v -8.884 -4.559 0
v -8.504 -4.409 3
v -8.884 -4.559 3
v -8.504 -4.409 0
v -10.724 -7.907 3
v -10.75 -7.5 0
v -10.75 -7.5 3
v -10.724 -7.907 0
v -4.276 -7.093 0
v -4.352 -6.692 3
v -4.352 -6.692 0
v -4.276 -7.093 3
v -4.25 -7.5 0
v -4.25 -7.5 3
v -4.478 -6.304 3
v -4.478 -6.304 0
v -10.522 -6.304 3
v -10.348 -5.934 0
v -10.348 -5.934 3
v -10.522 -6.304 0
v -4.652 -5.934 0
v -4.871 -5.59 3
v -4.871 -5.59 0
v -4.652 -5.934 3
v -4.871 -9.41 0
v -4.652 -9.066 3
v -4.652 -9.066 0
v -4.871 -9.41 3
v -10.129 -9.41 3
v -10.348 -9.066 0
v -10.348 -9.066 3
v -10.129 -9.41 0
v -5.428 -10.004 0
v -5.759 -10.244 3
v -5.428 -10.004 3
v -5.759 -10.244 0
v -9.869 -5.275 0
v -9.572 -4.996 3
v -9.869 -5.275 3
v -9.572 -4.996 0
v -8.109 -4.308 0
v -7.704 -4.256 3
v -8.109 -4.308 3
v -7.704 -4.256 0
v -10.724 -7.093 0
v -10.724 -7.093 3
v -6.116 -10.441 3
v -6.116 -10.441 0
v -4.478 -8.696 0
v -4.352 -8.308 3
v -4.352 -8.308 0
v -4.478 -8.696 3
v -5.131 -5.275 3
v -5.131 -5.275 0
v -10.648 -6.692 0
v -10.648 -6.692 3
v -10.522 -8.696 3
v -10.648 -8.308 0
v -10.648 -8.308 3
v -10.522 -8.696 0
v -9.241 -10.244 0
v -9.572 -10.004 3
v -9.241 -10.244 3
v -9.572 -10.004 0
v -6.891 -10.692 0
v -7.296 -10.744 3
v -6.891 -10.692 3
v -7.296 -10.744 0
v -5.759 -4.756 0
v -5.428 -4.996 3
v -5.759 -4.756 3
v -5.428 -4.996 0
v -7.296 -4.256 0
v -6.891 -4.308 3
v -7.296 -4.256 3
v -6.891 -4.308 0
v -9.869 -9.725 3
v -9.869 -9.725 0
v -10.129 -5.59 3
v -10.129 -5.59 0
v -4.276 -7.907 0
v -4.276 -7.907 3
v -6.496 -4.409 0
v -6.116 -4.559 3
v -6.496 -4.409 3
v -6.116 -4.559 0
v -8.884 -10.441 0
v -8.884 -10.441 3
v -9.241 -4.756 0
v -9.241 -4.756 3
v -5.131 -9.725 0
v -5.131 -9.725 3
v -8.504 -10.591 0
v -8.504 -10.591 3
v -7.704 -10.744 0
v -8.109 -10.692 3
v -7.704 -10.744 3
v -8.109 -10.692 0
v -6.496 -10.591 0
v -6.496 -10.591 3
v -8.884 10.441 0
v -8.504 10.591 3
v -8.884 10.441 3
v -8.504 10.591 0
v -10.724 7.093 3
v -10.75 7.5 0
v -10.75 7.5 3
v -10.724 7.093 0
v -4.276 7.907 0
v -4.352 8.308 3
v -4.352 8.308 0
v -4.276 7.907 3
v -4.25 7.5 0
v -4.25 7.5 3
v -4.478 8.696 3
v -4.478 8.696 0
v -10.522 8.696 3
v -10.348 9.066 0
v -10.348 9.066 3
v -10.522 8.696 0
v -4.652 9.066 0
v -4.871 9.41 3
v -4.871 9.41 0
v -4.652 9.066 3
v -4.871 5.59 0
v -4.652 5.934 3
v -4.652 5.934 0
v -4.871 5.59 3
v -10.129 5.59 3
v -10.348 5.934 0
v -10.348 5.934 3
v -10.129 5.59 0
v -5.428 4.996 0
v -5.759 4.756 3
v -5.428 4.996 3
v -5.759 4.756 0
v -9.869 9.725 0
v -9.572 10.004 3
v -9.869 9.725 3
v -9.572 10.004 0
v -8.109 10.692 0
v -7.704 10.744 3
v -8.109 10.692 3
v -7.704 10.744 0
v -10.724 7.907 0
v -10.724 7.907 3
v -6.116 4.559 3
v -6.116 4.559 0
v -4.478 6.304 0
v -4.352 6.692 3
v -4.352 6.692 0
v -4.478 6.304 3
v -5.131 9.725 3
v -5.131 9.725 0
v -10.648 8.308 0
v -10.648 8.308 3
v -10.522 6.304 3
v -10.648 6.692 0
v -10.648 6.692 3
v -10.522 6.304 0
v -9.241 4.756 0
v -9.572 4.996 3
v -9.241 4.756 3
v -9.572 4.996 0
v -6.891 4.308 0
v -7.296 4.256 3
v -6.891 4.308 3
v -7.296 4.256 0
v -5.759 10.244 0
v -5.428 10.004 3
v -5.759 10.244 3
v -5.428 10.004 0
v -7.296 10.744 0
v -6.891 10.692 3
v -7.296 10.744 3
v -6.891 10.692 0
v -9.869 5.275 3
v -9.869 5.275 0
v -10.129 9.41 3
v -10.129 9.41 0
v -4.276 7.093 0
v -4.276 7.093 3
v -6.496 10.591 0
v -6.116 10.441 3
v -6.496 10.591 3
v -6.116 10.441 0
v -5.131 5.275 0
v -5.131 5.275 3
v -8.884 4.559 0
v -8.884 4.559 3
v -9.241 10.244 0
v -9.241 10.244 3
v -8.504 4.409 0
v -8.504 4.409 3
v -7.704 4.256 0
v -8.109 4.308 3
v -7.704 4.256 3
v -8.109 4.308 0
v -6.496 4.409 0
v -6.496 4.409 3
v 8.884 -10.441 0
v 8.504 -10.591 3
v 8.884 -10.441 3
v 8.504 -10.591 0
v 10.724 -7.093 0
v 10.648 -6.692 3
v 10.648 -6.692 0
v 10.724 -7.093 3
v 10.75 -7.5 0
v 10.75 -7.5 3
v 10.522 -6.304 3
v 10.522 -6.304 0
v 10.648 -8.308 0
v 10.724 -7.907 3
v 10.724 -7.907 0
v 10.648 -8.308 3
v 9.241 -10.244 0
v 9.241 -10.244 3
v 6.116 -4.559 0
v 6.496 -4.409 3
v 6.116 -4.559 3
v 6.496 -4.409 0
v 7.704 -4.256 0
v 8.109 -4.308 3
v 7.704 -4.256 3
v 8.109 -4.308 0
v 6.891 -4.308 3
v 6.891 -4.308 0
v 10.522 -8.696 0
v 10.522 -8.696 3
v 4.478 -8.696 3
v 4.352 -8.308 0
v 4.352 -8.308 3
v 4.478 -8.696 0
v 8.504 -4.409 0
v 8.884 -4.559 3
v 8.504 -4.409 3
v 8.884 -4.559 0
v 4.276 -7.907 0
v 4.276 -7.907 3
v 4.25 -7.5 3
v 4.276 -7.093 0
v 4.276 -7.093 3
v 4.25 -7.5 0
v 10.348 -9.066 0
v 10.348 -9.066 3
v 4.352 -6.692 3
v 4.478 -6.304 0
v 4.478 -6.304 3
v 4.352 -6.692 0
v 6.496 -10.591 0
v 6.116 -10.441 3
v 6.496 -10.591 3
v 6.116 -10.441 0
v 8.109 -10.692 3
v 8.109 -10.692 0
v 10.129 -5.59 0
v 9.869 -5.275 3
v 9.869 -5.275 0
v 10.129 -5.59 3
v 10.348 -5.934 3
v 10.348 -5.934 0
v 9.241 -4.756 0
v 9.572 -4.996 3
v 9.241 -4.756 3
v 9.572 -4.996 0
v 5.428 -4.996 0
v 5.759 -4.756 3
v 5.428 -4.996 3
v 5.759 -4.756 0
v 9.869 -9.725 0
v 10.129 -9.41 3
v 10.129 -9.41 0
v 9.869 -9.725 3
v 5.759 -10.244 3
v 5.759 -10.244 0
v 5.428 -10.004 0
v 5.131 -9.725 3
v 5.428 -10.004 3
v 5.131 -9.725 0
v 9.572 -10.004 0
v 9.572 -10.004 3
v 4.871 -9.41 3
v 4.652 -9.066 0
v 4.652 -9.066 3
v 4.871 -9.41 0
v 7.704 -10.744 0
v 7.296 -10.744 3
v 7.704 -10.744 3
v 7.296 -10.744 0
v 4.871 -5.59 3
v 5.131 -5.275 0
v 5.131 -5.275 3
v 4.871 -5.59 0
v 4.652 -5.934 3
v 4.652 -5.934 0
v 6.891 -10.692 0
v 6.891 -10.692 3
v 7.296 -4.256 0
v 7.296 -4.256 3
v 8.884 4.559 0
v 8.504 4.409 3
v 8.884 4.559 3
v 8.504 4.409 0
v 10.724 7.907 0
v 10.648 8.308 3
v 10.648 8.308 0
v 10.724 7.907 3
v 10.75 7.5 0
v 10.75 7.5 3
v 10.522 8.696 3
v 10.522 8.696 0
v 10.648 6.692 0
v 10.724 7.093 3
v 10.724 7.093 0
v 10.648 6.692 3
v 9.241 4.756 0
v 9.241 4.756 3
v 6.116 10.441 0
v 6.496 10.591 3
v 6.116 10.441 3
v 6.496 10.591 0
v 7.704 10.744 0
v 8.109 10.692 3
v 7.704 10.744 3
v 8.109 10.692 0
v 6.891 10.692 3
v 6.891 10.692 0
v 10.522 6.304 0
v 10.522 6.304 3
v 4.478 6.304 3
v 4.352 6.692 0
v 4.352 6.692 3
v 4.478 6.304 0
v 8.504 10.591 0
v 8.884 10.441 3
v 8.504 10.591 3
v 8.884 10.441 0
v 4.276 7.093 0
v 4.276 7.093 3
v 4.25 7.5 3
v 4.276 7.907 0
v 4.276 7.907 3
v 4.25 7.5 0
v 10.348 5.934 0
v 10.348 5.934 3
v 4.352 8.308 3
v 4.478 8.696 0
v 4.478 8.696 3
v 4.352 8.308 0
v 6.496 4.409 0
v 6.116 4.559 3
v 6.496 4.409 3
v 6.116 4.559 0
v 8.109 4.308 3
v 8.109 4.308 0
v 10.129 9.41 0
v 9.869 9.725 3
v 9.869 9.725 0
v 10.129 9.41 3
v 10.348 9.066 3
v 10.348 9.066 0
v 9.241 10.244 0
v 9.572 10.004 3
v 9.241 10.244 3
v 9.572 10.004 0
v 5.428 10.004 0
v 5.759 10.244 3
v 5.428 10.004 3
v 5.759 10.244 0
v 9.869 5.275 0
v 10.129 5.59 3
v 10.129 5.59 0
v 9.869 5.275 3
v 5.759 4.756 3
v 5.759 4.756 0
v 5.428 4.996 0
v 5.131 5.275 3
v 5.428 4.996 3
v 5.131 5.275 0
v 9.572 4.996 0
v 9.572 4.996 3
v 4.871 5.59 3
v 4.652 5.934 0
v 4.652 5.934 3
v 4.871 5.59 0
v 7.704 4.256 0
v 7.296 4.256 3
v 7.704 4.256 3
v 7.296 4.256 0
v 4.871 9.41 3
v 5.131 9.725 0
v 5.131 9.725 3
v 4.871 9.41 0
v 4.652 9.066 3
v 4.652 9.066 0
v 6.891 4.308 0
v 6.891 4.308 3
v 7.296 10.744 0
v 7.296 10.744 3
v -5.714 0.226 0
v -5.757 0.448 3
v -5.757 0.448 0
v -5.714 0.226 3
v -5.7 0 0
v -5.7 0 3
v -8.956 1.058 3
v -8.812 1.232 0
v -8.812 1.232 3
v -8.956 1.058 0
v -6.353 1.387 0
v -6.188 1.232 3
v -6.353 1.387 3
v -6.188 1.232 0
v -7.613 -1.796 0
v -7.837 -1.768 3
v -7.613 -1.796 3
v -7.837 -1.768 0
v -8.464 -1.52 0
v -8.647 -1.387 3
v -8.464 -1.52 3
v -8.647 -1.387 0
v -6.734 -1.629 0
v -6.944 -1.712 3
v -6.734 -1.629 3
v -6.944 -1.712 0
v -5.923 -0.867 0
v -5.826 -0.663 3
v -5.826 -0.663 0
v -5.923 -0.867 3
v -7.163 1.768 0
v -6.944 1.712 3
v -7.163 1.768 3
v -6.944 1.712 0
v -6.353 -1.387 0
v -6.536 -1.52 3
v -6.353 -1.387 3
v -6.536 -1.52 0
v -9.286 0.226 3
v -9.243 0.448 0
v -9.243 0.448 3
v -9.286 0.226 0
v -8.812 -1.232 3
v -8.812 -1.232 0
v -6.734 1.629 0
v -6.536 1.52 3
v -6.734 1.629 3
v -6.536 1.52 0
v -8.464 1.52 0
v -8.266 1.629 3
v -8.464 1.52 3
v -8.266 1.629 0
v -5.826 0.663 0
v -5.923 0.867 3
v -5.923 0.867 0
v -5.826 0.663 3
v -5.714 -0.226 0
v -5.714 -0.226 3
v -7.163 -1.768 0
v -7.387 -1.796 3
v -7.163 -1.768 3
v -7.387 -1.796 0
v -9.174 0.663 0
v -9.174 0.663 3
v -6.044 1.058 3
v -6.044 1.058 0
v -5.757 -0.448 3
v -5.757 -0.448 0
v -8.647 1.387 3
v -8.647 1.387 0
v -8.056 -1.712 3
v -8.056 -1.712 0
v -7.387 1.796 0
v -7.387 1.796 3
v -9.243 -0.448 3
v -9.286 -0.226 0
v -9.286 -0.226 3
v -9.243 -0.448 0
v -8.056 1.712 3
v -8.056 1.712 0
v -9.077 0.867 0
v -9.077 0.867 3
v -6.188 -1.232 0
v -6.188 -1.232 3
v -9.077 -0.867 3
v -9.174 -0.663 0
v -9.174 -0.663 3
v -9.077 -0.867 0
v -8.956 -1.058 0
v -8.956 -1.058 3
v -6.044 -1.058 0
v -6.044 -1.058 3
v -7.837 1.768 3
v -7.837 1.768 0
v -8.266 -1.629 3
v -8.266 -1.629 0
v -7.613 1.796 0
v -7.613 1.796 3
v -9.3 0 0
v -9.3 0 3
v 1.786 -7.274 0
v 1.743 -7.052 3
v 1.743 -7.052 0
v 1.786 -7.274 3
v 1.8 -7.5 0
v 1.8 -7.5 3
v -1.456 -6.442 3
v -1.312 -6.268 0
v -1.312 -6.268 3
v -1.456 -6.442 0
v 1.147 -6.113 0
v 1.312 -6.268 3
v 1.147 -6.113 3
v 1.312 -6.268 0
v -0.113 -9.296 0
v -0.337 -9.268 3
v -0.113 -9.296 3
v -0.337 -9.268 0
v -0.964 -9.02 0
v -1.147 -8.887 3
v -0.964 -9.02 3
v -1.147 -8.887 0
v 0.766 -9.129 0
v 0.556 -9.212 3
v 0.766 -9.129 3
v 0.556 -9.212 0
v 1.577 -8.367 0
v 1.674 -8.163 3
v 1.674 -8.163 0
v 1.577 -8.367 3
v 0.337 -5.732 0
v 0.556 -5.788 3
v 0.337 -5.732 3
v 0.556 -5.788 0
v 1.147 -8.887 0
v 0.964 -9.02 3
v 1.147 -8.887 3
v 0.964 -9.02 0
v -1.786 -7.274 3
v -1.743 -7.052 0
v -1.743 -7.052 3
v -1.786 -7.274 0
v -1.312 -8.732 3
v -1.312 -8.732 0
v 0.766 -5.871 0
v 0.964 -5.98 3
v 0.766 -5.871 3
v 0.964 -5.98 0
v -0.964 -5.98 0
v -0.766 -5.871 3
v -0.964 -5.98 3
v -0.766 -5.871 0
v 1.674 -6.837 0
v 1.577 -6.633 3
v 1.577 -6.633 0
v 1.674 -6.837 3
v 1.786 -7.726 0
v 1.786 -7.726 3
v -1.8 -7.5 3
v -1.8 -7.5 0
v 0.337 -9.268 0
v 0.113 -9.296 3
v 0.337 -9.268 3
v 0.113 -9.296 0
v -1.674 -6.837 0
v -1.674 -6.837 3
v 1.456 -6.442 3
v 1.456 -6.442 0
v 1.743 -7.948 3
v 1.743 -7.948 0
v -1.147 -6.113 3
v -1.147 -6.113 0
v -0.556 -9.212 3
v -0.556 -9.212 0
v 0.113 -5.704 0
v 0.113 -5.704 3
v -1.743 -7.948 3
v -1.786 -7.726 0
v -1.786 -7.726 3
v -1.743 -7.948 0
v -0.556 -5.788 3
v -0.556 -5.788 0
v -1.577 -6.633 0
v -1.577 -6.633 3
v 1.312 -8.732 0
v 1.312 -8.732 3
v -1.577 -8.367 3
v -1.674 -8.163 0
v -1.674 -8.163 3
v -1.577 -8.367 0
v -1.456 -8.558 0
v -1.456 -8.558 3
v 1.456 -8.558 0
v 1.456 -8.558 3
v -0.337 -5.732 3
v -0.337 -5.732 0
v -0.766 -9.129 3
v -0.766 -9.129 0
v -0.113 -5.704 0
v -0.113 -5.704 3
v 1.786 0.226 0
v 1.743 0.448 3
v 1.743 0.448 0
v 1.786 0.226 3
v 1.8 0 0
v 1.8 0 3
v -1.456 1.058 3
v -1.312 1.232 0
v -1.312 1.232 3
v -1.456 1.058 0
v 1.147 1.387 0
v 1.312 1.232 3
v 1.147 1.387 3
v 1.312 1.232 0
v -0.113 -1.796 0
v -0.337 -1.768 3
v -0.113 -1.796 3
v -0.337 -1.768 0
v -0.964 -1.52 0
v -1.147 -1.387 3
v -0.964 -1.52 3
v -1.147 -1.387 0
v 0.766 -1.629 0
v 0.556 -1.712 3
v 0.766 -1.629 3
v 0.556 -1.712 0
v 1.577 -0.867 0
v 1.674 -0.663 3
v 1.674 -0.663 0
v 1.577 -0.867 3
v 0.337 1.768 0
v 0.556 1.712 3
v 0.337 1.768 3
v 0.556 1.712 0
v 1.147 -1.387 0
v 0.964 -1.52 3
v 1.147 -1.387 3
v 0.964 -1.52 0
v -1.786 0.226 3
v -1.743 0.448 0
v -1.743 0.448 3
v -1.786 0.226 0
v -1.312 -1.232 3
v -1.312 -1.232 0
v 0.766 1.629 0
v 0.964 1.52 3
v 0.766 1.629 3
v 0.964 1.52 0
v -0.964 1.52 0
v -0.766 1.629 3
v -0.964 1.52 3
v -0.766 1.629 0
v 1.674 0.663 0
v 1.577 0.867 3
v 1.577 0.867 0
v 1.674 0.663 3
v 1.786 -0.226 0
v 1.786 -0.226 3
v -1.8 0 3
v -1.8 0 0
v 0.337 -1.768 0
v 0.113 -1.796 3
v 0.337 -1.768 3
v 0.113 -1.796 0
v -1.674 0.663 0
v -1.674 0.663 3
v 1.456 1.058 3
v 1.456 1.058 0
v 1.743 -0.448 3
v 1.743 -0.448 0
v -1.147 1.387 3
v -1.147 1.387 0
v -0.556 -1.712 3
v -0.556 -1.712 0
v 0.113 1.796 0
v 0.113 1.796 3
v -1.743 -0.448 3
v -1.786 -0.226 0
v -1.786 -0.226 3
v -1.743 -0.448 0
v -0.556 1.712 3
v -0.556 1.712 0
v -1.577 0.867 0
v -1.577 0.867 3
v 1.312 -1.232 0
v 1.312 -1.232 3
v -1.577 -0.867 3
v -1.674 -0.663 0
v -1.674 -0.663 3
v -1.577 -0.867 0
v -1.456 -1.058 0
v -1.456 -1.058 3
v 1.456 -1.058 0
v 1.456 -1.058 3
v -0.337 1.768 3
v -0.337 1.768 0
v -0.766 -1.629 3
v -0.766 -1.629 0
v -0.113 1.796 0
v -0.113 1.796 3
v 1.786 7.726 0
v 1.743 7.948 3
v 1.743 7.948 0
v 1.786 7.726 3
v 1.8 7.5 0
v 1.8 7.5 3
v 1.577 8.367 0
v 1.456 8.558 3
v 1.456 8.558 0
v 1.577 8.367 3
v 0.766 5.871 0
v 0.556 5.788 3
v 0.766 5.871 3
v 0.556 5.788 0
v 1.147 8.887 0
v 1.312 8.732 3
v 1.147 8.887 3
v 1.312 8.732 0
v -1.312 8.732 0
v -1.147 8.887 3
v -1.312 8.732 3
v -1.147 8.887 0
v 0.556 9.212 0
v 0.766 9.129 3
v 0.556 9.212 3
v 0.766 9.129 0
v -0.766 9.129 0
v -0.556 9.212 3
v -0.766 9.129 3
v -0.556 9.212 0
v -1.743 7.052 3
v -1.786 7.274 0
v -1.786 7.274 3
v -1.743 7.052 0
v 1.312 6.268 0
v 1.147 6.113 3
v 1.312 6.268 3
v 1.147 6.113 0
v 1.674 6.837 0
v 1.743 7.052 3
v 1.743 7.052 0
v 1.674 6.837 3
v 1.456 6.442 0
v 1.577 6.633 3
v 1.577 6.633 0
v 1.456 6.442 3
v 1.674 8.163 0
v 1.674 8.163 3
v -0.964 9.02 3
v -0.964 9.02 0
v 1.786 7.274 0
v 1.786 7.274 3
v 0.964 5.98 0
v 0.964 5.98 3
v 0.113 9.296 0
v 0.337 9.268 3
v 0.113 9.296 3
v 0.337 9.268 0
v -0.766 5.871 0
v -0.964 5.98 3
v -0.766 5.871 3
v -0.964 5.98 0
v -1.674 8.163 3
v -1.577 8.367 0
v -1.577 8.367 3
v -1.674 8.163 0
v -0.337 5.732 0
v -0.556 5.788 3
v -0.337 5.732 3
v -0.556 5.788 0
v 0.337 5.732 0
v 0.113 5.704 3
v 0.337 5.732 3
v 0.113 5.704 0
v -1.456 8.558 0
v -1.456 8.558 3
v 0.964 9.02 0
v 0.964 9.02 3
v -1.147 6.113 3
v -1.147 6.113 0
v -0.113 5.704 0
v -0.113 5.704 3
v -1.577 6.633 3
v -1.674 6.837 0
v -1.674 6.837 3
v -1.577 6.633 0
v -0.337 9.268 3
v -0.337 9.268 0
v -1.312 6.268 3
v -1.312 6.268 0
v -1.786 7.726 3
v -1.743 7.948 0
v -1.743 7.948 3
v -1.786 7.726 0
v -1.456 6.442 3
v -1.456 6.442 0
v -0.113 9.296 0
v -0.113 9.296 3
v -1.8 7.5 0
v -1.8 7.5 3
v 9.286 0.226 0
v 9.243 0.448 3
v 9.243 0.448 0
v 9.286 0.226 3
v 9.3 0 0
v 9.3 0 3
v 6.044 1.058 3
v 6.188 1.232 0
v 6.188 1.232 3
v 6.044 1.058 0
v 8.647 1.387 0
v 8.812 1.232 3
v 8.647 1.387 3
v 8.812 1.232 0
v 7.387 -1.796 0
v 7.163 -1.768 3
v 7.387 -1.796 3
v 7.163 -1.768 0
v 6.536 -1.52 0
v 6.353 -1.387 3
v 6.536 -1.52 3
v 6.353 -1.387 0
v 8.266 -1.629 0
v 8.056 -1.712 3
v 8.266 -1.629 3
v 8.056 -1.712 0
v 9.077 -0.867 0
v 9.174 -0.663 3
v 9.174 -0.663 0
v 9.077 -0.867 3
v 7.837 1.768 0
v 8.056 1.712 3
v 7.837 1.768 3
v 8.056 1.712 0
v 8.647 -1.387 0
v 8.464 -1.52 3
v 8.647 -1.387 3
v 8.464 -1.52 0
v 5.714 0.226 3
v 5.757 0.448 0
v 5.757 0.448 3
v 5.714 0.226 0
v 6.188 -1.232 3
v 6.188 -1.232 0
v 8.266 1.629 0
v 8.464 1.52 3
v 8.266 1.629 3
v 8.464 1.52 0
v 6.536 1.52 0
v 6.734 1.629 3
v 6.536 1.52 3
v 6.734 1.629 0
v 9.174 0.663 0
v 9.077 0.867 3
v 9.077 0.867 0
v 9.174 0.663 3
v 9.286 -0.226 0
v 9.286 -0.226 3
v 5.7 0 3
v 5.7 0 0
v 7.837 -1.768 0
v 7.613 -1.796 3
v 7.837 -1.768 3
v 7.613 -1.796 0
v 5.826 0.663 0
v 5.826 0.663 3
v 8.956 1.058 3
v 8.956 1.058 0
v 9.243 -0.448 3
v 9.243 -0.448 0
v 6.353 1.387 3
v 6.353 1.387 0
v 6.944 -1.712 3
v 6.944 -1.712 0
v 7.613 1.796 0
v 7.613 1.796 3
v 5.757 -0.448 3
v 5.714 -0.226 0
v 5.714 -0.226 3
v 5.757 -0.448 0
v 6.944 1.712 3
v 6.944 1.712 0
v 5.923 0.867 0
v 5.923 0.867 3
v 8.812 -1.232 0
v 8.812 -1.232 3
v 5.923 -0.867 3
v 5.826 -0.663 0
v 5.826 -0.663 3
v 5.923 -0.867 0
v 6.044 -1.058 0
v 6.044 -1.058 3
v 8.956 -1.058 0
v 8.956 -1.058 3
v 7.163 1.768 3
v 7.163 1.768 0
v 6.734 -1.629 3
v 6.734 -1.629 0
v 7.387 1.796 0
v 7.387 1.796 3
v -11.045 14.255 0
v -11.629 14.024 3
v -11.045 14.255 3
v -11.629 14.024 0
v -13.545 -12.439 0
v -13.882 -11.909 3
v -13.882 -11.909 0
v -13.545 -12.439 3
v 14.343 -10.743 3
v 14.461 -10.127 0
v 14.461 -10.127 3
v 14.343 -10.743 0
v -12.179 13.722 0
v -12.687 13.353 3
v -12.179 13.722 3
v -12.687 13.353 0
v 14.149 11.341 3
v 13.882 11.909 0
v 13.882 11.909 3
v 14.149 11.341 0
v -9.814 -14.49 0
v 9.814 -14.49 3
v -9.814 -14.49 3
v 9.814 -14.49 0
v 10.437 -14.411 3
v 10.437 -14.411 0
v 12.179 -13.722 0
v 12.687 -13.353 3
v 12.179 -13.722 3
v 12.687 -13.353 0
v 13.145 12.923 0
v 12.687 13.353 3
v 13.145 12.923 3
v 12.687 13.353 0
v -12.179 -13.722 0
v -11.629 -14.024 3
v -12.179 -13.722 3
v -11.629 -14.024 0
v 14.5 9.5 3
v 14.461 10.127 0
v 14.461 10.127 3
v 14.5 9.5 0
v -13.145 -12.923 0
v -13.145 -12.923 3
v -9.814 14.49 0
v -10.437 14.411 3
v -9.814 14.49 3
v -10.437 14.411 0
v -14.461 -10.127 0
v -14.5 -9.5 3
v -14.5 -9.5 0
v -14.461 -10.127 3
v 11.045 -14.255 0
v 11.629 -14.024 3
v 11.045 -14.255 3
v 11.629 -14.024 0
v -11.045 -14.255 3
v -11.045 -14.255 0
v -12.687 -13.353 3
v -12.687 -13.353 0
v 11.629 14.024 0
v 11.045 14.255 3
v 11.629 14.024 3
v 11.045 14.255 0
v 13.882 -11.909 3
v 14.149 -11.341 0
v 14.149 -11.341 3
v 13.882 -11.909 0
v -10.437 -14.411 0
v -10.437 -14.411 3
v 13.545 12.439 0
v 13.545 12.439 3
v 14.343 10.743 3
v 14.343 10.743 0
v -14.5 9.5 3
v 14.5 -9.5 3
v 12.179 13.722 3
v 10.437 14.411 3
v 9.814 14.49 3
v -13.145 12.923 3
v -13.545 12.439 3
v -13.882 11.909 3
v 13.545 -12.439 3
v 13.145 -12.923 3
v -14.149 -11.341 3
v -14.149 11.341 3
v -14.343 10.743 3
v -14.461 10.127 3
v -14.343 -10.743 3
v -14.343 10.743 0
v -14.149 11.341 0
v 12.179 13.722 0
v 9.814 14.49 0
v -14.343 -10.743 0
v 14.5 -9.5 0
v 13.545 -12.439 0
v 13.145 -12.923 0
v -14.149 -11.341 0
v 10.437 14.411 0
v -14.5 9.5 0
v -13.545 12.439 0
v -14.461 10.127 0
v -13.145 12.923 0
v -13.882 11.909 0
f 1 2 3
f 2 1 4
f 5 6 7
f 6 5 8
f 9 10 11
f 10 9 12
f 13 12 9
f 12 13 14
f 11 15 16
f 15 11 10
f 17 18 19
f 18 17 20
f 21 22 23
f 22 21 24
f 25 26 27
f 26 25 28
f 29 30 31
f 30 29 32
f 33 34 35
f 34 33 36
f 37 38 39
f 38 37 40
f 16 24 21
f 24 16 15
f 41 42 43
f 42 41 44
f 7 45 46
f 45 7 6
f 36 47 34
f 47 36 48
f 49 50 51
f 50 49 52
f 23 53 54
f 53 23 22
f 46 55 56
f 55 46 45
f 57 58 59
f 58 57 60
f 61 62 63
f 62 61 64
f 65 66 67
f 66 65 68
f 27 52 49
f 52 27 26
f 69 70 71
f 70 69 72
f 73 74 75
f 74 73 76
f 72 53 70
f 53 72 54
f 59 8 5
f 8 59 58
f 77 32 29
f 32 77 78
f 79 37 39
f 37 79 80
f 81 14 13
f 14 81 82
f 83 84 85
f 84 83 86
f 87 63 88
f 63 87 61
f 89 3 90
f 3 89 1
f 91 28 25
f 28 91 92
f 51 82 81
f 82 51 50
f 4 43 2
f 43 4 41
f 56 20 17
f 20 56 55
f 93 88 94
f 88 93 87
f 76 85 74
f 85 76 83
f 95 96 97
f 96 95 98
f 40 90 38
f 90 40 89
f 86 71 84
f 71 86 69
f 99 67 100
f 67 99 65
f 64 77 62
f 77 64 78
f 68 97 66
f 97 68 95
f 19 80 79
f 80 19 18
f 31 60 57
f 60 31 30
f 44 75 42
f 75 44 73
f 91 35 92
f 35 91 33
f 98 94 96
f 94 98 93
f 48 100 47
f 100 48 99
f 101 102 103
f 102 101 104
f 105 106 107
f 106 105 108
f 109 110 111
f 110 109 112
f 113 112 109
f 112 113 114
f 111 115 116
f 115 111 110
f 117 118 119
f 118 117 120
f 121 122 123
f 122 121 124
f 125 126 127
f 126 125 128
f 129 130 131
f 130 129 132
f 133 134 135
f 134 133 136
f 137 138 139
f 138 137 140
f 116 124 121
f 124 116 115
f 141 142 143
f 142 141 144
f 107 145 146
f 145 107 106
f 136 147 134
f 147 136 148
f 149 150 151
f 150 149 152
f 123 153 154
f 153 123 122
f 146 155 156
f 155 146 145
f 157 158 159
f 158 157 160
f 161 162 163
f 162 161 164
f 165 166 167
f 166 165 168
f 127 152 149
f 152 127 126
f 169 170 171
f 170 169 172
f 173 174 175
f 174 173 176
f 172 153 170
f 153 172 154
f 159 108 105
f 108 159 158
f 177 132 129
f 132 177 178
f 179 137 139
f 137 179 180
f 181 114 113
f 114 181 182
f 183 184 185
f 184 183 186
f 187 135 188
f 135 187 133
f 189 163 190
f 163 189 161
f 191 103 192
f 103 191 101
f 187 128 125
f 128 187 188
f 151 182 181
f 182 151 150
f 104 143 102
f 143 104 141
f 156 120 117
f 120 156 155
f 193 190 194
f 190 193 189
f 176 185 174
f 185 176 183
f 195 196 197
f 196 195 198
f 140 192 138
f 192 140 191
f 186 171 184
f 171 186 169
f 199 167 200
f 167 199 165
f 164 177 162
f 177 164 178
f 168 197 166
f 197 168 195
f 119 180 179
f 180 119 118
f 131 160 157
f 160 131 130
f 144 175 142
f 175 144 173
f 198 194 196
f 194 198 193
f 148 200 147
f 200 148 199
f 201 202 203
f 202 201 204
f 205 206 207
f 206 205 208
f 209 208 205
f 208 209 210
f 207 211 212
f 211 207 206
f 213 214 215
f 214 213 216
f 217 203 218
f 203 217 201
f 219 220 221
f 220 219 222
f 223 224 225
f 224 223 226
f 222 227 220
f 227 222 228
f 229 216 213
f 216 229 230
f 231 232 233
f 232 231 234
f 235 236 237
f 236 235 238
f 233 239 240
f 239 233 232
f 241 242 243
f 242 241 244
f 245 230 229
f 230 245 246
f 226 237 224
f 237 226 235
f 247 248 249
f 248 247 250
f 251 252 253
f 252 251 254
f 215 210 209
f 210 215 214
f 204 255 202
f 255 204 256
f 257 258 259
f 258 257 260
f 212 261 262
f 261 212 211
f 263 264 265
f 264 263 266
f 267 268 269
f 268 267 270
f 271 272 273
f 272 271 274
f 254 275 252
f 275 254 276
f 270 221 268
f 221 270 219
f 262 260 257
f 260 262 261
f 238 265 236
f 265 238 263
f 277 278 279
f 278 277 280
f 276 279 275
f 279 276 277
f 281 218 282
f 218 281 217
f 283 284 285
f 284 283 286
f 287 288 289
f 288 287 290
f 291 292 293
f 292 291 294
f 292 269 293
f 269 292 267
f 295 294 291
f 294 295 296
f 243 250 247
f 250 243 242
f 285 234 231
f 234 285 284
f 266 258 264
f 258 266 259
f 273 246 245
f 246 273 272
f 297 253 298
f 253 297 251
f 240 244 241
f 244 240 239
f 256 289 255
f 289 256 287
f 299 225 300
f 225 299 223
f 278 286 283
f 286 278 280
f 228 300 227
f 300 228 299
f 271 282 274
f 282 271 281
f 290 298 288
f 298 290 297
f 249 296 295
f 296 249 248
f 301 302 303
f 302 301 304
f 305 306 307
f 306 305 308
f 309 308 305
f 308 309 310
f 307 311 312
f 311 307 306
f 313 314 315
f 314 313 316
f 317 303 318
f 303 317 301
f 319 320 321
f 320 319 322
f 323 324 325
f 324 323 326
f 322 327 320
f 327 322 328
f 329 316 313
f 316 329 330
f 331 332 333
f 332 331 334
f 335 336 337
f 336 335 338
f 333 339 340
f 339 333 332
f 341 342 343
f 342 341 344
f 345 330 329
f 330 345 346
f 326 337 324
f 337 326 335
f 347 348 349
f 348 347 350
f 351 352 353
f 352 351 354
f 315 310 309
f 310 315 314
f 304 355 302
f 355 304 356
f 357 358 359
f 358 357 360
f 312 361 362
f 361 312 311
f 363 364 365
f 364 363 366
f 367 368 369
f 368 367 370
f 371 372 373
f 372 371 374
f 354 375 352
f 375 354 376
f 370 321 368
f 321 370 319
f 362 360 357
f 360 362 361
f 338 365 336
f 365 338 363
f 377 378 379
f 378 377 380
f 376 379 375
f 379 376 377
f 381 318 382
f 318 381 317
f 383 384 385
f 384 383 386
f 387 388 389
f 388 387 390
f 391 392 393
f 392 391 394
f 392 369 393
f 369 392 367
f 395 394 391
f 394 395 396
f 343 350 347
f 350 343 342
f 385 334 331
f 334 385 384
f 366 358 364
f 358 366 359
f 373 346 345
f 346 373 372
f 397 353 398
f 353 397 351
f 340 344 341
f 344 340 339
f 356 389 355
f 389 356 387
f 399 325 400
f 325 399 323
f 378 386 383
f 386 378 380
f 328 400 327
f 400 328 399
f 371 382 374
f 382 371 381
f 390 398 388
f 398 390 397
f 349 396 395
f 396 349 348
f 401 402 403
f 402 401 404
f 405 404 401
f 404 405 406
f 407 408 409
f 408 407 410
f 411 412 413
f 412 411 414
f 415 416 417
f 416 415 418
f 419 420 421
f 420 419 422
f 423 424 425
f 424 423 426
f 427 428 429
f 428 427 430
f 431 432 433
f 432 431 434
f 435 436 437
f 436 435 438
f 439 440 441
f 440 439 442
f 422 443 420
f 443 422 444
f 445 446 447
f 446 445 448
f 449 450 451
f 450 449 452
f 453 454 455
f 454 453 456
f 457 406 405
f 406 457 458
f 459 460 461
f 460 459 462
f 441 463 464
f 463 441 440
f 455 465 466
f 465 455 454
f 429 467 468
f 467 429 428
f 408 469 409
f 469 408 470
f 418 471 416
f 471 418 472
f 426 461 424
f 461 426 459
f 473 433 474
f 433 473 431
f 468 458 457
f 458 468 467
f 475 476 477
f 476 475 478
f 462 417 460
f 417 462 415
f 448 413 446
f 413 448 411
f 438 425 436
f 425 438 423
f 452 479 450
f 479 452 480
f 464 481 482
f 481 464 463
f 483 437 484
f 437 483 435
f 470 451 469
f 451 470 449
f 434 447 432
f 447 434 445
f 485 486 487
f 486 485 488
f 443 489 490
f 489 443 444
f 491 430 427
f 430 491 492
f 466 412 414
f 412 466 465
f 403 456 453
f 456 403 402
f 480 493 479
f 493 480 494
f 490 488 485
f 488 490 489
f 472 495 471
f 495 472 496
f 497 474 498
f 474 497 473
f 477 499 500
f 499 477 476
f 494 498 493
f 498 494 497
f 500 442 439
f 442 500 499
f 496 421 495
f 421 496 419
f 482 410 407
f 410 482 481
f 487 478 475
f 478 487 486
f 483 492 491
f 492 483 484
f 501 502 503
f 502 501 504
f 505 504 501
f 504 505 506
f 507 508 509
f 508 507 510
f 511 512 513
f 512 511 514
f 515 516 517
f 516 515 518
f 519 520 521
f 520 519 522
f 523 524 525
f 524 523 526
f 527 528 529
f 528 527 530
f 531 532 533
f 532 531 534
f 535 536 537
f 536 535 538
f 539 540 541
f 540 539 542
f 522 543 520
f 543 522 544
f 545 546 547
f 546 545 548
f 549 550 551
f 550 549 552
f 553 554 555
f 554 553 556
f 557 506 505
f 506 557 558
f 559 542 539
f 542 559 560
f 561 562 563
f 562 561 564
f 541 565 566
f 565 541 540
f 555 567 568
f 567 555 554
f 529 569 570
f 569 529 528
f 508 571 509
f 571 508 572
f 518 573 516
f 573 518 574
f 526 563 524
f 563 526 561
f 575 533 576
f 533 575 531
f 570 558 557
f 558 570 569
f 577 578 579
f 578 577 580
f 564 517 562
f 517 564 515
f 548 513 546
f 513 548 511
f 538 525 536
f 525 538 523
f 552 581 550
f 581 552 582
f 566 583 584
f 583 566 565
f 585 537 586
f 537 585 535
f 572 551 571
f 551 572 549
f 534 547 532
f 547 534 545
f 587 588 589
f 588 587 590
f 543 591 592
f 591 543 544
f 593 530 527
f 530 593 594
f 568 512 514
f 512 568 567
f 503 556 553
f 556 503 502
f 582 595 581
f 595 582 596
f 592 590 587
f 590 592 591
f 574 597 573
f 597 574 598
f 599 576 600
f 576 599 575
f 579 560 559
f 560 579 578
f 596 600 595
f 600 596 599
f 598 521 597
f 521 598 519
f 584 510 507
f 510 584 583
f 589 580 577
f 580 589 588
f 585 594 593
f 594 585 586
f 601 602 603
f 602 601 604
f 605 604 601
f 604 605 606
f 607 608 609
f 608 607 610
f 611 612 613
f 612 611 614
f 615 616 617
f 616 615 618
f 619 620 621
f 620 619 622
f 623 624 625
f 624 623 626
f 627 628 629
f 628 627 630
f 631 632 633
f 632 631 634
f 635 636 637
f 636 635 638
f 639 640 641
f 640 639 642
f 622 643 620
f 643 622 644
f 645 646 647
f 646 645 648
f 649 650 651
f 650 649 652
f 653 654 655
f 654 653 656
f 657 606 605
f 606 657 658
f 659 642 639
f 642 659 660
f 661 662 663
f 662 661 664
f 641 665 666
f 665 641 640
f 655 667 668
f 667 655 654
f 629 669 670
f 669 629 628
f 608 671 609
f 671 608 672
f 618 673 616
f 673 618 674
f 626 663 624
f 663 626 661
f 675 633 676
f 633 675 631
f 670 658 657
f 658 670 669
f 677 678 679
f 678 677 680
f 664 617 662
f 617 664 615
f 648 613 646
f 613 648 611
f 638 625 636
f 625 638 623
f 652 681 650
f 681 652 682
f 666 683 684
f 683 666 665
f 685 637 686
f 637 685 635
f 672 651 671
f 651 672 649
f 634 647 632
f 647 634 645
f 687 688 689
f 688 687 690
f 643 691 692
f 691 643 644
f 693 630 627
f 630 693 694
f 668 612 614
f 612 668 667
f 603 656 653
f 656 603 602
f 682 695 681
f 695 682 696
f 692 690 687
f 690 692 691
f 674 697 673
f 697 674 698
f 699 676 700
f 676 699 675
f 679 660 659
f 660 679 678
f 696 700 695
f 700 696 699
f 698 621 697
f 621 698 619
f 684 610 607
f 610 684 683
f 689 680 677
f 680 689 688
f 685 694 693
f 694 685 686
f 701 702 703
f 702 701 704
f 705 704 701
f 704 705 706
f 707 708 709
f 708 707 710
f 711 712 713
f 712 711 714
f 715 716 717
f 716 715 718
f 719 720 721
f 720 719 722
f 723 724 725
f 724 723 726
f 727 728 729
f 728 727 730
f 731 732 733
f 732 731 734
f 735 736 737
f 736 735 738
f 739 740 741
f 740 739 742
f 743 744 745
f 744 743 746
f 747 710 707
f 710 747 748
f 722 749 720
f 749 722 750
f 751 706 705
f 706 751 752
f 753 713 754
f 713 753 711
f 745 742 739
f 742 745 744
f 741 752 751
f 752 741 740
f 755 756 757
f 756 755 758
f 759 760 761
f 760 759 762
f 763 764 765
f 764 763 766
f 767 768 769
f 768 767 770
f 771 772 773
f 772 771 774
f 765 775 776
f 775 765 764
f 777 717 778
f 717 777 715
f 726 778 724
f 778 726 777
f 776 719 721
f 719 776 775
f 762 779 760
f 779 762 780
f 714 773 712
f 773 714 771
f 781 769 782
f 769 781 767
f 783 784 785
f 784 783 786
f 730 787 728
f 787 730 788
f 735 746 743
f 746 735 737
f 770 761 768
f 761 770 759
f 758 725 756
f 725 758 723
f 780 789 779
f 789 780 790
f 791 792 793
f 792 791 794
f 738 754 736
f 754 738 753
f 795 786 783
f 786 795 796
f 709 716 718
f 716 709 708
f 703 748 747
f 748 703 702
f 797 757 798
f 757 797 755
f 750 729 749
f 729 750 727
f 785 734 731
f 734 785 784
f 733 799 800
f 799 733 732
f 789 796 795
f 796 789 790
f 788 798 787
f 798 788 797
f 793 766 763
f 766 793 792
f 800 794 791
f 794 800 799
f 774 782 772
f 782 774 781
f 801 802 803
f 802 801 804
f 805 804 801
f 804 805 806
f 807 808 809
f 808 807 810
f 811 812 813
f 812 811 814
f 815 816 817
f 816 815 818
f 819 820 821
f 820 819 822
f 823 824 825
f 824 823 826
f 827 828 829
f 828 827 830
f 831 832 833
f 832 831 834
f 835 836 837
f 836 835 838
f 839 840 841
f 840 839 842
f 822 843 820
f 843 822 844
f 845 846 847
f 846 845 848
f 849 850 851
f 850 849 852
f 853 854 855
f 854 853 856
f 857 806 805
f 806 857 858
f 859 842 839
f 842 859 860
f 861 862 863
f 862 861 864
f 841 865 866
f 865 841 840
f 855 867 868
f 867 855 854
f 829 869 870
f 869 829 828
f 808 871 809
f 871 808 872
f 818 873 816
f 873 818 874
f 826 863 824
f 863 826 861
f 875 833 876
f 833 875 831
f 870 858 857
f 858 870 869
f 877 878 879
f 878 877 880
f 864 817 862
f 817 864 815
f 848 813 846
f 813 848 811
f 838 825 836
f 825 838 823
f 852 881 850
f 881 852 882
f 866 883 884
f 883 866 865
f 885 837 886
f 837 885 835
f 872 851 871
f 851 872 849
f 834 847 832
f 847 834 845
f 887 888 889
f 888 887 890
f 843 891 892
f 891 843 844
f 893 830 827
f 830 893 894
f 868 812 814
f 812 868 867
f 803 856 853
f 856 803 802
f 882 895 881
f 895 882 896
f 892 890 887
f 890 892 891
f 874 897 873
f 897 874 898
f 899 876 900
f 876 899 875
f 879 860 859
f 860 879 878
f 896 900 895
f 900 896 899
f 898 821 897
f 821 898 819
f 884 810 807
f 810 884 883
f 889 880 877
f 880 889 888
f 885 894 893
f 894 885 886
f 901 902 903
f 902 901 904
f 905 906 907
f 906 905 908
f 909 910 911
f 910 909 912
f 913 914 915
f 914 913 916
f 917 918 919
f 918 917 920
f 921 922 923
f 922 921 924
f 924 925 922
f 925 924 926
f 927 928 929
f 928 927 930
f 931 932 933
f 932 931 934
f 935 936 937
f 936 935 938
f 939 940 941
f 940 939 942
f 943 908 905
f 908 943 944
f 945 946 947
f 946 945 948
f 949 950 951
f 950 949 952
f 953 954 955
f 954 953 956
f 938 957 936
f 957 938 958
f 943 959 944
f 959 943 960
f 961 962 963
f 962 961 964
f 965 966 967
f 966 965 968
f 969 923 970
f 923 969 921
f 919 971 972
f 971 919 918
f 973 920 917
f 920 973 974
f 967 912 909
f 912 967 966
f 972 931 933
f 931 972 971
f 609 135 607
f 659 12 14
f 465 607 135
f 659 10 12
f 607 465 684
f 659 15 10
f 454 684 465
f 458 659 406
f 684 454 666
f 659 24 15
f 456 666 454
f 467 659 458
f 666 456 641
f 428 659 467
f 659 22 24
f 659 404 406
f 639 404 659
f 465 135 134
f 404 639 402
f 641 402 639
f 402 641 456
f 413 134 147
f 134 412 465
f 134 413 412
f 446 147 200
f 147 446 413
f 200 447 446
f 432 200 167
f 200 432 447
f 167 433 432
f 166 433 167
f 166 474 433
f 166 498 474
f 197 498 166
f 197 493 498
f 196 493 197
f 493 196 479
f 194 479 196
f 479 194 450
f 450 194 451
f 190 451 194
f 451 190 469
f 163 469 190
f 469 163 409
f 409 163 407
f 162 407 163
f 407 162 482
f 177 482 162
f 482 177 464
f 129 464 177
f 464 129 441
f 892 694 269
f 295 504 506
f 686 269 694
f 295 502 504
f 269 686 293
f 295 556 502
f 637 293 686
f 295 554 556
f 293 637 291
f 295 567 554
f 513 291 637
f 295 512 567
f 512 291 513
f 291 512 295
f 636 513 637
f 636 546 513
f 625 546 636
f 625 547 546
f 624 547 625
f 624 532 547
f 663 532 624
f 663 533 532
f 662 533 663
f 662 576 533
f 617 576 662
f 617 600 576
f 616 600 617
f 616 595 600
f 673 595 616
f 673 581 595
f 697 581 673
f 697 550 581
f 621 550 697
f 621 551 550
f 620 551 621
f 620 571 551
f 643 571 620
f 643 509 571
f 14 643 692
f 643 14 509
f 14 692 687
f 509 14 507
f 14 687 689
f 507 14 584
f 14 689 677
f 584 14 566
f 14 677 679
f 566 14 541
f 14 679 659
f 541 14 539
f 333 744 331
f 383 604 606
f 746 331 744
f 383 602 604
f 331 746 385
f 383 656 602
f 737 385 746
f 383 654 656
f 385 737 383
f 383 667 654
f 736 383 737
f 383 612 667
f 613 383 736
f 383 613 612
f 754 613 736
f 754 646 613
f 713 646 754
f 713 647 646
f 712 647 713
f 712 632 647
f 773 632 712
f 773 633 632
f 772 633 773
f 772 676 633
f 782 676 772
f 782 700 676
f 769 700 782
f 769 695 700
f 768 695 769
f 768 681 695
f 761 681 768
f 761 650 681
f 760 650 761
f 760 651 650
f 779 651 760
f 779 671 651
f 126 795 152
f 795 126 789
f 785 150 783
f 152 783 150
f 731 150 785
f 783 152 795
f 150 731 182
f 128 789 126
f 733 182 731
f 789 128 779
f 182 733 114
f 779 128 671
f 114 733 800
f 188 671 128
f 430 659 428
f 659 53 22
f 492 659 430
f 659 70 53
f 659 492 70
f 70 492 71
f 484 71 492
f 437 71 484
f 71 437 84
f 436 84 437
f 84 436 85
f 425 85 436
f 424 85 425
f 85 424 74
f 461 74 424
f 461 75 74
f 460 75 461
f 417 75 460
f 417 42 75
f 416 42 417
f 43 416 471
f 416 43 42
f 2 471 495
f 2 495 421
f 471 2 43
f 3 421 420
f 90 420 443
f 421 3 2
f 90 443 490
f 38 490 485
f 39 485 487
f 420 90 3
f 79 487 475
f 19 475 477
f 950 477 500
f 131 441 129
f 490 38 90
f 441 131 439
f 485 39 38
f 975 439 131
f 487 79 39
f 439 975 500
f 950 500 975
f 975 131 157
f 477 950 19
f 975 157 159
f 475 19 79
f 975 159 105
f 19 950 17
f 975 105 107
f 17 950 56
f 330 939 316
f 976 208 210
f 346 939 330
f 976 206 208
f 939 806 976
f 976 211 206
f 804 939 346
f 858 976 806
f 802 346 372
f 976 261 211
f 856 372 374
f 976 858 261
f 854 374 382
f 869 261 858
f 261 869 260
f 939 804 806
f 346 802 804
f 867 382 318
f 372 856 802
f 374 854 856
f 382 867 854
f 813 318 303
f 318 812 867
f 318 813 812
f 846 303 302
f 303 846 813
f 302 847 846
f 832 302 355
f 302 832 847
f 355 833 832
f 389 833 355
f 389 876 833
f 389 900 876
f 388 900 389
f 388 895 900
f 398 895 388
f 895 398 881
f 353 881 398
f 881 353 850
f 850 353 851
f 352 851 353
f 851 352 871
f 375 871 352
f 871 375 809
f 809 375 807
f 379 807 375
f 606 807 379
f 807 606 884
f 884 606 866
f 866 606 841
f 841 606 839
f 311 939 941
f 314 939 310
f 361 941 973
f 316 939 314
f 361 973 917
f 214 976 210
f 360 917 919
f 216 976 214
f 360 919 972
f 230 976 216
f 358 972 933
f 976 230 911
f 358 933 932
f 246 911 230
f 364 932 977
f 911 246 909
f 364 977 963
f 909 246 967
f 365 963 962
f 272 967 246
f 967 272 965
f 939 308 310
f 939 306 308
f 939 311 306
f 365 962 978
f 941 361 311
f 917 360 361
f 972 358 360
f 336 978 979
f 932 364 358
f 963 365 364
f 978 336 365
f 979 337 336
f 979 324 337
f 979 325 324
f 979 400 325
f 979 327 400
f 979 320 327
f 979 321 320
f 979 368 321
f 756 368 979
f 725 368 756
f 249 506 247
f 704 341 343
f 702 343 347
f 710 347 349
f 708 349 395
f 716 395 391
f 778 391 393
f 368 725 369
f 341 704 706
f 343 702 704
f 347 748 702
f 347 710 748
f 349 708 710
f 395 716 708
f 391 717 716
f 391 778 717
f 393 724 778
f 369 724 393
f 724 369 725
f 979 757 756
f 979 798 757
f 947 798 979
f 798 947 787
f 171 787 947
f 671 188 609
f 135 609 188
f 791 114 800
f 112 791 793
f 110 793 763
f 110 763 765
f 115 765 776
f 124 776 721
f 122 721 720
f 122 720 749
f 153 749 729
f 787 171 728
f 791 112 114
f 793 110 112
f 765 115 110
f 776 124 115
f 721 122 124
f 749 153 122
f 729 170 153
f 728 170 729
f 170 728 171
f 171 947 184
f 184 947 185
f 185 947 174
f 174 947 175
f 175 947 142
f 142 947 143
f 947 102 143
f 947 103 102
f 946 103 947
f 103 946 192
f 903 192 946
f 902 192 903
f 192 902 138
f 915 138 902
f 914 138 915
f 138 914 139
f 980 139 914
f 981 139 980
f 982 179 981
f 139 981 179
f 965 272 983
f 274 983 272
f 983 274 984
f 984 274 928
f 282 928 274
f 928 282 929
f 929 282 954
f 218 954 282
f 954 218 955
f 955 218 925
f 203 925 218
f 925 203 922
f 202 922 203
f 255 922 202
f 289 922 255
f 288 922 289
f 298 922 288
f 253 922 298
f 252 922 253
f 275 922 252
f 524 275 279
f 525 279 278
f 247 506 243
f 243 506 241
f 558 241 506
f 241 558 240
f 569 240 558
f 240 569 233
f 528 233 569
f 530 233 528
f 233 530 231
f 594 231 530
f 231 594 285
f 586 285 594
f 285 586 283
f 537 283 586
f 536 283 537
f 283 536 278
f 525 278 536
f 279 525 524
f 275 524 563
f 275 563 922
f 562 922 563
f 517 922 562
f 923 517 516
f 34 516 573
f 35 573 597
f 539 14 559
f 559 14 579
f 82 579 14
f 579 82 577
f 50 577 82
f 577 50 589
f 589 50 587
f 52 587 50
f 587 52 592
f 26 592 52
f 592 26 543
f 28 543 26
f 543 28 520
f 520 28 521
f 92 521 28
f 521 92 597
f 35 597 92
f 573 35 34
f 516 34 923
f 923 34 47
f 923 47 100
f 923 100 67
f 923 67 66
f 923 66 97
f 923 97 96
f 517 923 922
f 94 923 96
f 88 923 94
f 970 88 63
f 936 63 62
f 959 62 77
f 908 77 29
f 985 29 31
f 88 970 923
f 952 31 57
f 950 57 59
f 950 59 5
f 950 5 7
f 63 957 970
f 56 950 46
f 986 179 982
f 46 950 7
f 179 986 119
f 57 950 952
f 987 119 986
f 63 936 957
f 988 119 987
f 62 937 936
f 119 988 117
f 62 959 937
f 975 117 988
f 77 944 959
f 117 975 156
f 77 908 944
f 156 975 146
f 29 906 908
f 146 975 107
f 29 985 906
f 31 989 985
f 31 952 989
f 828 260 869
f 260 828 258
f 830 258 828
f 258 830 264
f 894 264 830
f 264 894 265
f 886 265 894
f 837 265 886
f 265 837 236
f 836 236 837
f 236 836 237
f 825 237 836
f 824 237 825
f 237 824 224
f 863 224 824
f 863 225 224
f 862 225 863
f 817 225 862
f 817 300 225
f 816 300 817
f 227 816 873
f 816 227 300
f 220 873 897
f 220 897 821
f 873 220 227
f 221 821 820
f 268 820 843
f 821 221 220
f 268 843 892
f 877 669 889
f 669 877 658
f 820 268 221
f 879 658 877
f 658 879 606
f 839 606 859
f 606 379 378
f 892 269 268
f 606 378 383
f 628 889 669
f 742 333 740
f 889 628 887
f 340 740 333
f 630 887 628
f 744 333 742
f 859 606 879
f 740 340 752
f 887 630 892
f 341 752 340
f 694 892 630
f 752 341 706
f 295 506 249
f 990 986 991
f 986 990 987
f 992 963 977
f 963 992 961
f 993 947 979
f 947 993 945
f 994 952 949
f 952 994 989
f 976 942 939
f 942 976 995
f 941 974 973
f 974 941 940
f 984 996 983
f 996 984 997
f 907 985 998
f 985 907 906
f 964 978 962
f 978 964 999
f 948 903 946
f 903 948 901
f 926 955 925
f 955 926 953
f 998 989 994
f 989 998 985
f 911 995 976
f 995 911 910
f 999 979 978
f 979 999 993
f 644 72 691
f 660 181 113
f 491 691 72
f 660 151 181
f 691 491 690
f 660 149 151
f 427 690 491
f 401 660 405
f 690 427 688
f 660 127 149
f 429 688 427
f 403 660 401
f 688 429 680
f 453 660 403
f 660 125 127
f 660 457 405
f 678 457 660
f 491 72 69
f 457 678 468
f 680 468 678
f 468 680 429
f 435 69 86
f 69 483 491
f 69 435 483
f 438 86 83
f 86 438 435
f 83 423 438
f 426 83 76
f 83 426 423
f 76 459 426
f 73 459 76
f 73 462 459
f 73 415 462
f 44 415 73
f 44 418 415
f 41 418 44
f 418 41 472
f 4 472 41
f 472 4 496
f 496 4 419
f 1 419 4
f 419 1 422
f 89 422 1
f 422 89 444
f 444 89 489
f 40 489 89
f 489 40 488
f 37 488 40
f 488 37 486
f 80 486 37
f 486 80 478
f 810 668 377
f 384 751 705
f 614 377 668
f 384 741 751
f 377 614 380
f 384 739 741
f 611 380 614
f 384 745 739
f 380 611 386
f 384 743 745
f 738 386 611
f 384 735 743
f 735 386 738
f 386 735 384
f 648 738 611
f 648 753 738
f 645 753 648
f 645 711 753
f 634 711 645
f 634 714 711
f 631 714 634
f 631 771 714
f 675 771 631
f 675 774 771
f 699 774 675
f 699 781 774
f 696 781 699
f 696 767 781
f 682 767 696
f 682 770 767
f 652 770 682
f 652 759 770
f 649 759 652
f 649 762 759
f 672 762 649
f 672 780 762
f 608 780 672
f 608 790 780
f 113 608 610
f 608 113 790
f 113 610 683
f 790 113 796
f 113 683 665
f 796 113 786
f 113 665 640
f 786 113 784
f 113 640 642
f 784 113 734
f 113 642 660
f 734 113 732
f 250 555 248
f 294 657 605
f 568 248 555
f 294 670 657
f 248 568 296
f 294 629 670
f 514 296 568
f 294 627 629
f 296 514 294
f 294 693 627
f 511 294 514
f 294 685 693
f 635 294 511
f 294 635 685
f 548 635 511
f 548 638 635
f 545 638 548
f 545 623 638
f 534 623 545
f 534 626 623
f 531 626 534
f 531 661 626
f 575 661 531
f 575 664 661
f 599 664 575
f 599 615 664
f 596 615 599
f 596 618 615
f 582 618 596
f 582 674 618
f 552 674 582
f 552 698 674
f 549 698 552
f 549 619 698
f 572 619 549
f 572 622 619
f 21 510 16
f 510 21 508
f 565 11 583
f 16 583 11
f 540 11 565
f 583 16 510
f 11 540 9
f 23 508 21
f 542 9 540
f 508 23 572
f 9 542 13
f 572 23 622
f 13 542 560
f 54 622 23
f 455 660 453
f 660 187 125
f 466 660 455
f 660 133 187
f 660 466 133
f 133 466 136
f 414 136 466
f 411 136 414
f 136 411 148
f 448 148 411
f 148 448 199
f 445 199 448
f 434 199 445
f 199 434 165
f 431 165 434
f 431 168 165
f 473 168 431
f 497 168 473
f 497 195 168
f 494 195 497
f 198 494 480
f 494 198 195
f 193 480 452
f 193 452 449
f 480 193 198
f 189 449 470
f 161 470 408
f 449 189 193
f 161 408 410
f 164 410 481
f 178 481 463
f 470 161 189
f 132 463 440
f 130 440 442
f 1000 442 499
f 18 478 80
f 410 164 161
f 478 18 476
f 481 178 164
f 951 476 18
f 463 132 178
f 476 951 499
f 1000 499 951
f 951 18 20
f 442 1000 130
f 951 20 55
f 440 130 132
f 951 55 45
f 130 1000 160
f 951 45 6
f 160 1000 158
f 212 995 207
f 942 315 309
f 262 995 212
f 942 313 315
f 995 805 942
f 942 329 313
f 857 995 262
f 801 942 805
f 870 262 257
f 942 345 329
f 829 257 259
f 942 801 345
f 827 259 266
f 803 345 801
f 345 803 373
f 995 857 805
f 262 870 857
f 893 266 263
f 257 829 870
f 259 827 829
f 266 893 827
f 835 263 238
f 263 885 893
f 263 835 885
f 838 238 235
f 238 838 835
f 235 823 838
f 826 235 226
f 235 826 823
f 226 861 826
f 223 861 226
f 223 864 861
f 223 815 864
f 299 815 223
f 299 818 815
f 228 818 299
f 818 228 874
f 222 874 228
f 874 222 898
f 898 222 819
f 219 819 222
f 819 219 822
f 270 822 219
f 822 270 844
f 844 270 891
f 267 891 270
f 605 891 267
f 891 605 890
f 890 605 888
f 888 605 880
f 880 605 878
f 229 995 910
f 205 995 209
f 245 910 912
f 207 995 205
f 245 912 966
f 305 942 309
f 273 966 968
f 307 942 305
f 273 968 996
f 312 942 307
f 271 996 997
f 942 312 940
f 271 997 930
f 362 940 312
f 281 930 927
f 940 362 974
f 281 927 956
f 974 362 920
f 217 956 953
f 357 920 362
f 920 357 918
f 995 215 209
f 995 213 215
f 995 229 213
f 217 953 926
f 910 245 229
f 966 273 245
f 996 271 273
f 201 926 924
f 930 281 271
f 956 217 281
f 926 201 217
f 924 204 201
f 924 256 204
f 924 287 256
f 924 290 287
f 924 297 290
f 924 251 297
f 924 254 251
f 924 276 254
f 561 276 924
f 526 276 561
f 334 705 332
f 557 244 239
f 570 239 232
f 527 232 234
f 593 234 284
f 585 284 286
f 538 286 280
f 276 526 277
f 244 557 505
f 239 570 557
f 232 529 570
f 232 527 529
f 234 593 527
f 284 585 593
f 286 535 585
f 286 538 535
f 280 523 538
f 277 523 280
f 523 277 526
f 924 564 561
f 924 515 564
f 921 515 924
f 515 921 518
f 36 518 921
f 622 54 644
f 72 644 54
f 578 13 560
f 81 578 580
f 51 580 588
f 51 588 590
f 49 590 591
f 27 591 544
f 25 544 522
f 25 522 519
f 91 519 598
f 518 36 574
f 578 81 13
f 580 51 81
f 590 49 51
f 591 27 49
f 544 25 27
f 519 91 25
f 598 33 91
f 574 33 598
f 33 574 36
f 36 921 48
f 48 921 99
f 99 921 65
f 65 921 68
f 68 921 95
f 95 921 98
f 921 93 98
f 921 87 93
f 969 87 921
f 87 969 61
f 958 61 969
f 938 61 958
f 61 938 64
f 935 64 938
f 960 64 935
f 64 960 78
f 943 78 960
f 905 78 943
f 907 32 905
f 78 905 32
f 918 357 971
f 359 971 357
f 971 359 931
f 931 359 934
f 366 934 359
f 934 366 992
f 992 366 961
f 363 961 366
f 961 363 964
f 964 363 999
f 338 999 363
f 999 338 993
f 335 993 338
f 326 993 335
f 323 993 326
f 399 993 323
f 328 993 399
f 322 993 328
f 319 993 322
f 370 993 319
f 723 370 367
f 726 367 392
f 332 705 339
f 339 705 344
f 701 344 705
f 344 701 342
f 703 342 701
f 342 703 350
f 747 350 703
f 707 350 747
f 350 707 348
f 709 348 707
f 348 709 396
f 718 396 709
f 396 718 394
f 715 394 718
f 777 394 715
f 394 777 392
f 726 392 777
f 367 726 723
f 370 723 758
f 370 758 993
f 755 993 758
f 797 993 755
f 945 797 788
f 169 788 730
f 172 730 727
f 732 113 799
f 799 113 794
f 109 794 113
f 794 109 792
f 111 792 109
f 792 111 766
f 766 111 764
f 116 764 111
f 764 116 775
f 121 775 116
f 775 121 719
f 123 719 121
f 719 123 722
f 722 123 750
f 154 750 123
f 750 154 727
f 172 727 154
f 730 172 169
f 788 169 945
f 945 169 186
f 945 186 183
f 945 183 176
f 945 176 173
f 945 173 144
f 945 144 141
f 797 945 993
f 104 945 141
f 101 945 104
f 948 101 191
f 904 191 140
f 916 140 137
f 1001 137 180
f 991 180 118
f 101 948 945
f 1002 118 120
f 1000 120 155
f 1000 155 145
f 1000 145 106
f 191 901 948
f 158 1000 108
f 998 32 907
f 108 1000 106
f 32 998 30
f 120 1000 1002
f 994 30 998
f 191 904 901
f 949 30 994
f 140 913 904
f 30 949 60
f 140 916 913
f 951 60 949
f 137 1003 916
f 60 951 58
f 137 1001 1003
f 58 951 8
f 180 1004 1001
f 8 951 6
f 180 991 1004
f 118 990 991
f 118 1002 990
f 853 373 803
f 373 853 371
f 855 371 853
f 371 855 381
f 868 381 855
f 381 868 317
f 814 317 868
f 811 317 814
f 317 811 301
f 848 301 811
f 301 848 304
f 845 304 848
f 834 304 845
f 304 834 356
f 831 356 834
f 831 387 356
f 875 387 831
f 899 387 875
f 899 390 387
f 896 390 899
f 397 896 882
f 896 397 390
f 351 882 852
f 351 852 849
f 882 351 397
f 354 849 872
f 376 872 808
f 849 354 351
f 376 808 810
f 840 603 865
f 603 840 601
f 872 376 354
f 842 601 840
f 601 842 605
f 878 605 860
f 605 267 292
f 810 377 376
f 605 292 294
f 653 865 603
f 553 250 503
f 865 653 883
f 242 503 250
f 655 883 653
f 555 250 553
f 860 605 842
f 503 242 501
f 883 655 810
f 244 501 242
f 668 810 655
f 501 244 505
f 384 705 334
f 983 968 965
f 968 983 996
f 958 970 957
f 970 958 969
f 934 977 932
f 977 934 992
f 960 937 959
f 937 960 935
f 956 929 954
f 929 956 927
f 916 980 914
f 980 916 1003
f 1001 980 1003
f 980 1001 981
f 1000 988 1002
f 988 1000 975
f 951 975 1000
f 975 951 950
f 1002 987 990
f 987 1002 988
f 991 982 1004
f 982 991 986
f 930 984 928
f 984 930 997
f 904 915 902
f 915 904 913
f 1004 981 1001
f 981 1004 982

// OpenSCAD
$fn = 50;

difference() {
	union() {
		hull() {
			translate(v = [-9.5, 9.5, 0]) {
				cylinder(h = 3, r = 5);
			}
			translate(v = [9.5, 9.5, 0]) {
				cylinder(h = 3, r = 5);
			}
			translate(v = [-9.5, -9.5, 0]) {
				cylinder(h = 3, r = 5);
			}
			translate(v = [9.5, -9.5, 0]) {
				cylinder(h = 3, r = 5);
			}
		}
	}
	union() {
		translate(v = [-7.5, -7.5, 0]) {
			translate(v = [0, 0, -100]) {
				cylinder(h = 200, r = 3.25);
			}
		}
		translate(v = [-7.5, 7.5, 0]) {
			translate(v = [0, 0, -100]) {
				cylinder(h = 200, r = 3.25);
			}
		}
		translate(v = [7.5, -7.5, 0]) {
			translate(v = [0, 0, -100]) {
				cylinder(h = 200, r = 3.25);
			}
		}
		translate(v = [7.5, 7.5, 0]) {
			translate(v = [0, 0, -100]) {
				cylinder(h = 200, r = 3.25);
			}
		}
		translate(v = [-7.5, -7.5, 0]) {
			translate(v = [0, 0, -100]) {
				cylinder(h = 200, r = 1.8);
			}
		}
		translate(v = [-7.5, 0.0, 0]) {
			translate(v = [0, 0, -100]) {
				cylinder(h = 200, r = 1.8);
			}
		}
		translate(v = [-7.5, 7.5, 0]) {
			translate(v = [0, 0, -100]) {
				cylinder(h = 200, r = 1.8);
			}
		}
		translate(v = [0.0, -7.5, 0]) {
			translate(v = [0, 0, -100]) {
				cylinder(h = 200, r = 1.8);
			}
		}
		translate(v = [0, 0, -100]) {
			cylinder(h = 200, r = 1.8);
		}
		translate(v = [0.0, 7.5, 0]) {
			translate(v = [0, 0, -100]) {
				cylinder(h = 200, r = 1.8);
			}
		}
		translate(v = [7.5, -7.5, 0]) {
			translate(v = [0, 0, -100]) {
				cylinder(h = 200, r = 1.8);
			}
		}
		translate(v = [7.5, 0.0, 0]) {
			translate(v = [0, 0, -100]) {
				cylinder(h = 200, r = 1.8);
			}
		}
		translate(v = [7.5, 7.5, 0]) {
			translate(v = [0, 0, -100]) {
				cylinder(h = 200, r = 1.8);
			}
		}
	}
}
